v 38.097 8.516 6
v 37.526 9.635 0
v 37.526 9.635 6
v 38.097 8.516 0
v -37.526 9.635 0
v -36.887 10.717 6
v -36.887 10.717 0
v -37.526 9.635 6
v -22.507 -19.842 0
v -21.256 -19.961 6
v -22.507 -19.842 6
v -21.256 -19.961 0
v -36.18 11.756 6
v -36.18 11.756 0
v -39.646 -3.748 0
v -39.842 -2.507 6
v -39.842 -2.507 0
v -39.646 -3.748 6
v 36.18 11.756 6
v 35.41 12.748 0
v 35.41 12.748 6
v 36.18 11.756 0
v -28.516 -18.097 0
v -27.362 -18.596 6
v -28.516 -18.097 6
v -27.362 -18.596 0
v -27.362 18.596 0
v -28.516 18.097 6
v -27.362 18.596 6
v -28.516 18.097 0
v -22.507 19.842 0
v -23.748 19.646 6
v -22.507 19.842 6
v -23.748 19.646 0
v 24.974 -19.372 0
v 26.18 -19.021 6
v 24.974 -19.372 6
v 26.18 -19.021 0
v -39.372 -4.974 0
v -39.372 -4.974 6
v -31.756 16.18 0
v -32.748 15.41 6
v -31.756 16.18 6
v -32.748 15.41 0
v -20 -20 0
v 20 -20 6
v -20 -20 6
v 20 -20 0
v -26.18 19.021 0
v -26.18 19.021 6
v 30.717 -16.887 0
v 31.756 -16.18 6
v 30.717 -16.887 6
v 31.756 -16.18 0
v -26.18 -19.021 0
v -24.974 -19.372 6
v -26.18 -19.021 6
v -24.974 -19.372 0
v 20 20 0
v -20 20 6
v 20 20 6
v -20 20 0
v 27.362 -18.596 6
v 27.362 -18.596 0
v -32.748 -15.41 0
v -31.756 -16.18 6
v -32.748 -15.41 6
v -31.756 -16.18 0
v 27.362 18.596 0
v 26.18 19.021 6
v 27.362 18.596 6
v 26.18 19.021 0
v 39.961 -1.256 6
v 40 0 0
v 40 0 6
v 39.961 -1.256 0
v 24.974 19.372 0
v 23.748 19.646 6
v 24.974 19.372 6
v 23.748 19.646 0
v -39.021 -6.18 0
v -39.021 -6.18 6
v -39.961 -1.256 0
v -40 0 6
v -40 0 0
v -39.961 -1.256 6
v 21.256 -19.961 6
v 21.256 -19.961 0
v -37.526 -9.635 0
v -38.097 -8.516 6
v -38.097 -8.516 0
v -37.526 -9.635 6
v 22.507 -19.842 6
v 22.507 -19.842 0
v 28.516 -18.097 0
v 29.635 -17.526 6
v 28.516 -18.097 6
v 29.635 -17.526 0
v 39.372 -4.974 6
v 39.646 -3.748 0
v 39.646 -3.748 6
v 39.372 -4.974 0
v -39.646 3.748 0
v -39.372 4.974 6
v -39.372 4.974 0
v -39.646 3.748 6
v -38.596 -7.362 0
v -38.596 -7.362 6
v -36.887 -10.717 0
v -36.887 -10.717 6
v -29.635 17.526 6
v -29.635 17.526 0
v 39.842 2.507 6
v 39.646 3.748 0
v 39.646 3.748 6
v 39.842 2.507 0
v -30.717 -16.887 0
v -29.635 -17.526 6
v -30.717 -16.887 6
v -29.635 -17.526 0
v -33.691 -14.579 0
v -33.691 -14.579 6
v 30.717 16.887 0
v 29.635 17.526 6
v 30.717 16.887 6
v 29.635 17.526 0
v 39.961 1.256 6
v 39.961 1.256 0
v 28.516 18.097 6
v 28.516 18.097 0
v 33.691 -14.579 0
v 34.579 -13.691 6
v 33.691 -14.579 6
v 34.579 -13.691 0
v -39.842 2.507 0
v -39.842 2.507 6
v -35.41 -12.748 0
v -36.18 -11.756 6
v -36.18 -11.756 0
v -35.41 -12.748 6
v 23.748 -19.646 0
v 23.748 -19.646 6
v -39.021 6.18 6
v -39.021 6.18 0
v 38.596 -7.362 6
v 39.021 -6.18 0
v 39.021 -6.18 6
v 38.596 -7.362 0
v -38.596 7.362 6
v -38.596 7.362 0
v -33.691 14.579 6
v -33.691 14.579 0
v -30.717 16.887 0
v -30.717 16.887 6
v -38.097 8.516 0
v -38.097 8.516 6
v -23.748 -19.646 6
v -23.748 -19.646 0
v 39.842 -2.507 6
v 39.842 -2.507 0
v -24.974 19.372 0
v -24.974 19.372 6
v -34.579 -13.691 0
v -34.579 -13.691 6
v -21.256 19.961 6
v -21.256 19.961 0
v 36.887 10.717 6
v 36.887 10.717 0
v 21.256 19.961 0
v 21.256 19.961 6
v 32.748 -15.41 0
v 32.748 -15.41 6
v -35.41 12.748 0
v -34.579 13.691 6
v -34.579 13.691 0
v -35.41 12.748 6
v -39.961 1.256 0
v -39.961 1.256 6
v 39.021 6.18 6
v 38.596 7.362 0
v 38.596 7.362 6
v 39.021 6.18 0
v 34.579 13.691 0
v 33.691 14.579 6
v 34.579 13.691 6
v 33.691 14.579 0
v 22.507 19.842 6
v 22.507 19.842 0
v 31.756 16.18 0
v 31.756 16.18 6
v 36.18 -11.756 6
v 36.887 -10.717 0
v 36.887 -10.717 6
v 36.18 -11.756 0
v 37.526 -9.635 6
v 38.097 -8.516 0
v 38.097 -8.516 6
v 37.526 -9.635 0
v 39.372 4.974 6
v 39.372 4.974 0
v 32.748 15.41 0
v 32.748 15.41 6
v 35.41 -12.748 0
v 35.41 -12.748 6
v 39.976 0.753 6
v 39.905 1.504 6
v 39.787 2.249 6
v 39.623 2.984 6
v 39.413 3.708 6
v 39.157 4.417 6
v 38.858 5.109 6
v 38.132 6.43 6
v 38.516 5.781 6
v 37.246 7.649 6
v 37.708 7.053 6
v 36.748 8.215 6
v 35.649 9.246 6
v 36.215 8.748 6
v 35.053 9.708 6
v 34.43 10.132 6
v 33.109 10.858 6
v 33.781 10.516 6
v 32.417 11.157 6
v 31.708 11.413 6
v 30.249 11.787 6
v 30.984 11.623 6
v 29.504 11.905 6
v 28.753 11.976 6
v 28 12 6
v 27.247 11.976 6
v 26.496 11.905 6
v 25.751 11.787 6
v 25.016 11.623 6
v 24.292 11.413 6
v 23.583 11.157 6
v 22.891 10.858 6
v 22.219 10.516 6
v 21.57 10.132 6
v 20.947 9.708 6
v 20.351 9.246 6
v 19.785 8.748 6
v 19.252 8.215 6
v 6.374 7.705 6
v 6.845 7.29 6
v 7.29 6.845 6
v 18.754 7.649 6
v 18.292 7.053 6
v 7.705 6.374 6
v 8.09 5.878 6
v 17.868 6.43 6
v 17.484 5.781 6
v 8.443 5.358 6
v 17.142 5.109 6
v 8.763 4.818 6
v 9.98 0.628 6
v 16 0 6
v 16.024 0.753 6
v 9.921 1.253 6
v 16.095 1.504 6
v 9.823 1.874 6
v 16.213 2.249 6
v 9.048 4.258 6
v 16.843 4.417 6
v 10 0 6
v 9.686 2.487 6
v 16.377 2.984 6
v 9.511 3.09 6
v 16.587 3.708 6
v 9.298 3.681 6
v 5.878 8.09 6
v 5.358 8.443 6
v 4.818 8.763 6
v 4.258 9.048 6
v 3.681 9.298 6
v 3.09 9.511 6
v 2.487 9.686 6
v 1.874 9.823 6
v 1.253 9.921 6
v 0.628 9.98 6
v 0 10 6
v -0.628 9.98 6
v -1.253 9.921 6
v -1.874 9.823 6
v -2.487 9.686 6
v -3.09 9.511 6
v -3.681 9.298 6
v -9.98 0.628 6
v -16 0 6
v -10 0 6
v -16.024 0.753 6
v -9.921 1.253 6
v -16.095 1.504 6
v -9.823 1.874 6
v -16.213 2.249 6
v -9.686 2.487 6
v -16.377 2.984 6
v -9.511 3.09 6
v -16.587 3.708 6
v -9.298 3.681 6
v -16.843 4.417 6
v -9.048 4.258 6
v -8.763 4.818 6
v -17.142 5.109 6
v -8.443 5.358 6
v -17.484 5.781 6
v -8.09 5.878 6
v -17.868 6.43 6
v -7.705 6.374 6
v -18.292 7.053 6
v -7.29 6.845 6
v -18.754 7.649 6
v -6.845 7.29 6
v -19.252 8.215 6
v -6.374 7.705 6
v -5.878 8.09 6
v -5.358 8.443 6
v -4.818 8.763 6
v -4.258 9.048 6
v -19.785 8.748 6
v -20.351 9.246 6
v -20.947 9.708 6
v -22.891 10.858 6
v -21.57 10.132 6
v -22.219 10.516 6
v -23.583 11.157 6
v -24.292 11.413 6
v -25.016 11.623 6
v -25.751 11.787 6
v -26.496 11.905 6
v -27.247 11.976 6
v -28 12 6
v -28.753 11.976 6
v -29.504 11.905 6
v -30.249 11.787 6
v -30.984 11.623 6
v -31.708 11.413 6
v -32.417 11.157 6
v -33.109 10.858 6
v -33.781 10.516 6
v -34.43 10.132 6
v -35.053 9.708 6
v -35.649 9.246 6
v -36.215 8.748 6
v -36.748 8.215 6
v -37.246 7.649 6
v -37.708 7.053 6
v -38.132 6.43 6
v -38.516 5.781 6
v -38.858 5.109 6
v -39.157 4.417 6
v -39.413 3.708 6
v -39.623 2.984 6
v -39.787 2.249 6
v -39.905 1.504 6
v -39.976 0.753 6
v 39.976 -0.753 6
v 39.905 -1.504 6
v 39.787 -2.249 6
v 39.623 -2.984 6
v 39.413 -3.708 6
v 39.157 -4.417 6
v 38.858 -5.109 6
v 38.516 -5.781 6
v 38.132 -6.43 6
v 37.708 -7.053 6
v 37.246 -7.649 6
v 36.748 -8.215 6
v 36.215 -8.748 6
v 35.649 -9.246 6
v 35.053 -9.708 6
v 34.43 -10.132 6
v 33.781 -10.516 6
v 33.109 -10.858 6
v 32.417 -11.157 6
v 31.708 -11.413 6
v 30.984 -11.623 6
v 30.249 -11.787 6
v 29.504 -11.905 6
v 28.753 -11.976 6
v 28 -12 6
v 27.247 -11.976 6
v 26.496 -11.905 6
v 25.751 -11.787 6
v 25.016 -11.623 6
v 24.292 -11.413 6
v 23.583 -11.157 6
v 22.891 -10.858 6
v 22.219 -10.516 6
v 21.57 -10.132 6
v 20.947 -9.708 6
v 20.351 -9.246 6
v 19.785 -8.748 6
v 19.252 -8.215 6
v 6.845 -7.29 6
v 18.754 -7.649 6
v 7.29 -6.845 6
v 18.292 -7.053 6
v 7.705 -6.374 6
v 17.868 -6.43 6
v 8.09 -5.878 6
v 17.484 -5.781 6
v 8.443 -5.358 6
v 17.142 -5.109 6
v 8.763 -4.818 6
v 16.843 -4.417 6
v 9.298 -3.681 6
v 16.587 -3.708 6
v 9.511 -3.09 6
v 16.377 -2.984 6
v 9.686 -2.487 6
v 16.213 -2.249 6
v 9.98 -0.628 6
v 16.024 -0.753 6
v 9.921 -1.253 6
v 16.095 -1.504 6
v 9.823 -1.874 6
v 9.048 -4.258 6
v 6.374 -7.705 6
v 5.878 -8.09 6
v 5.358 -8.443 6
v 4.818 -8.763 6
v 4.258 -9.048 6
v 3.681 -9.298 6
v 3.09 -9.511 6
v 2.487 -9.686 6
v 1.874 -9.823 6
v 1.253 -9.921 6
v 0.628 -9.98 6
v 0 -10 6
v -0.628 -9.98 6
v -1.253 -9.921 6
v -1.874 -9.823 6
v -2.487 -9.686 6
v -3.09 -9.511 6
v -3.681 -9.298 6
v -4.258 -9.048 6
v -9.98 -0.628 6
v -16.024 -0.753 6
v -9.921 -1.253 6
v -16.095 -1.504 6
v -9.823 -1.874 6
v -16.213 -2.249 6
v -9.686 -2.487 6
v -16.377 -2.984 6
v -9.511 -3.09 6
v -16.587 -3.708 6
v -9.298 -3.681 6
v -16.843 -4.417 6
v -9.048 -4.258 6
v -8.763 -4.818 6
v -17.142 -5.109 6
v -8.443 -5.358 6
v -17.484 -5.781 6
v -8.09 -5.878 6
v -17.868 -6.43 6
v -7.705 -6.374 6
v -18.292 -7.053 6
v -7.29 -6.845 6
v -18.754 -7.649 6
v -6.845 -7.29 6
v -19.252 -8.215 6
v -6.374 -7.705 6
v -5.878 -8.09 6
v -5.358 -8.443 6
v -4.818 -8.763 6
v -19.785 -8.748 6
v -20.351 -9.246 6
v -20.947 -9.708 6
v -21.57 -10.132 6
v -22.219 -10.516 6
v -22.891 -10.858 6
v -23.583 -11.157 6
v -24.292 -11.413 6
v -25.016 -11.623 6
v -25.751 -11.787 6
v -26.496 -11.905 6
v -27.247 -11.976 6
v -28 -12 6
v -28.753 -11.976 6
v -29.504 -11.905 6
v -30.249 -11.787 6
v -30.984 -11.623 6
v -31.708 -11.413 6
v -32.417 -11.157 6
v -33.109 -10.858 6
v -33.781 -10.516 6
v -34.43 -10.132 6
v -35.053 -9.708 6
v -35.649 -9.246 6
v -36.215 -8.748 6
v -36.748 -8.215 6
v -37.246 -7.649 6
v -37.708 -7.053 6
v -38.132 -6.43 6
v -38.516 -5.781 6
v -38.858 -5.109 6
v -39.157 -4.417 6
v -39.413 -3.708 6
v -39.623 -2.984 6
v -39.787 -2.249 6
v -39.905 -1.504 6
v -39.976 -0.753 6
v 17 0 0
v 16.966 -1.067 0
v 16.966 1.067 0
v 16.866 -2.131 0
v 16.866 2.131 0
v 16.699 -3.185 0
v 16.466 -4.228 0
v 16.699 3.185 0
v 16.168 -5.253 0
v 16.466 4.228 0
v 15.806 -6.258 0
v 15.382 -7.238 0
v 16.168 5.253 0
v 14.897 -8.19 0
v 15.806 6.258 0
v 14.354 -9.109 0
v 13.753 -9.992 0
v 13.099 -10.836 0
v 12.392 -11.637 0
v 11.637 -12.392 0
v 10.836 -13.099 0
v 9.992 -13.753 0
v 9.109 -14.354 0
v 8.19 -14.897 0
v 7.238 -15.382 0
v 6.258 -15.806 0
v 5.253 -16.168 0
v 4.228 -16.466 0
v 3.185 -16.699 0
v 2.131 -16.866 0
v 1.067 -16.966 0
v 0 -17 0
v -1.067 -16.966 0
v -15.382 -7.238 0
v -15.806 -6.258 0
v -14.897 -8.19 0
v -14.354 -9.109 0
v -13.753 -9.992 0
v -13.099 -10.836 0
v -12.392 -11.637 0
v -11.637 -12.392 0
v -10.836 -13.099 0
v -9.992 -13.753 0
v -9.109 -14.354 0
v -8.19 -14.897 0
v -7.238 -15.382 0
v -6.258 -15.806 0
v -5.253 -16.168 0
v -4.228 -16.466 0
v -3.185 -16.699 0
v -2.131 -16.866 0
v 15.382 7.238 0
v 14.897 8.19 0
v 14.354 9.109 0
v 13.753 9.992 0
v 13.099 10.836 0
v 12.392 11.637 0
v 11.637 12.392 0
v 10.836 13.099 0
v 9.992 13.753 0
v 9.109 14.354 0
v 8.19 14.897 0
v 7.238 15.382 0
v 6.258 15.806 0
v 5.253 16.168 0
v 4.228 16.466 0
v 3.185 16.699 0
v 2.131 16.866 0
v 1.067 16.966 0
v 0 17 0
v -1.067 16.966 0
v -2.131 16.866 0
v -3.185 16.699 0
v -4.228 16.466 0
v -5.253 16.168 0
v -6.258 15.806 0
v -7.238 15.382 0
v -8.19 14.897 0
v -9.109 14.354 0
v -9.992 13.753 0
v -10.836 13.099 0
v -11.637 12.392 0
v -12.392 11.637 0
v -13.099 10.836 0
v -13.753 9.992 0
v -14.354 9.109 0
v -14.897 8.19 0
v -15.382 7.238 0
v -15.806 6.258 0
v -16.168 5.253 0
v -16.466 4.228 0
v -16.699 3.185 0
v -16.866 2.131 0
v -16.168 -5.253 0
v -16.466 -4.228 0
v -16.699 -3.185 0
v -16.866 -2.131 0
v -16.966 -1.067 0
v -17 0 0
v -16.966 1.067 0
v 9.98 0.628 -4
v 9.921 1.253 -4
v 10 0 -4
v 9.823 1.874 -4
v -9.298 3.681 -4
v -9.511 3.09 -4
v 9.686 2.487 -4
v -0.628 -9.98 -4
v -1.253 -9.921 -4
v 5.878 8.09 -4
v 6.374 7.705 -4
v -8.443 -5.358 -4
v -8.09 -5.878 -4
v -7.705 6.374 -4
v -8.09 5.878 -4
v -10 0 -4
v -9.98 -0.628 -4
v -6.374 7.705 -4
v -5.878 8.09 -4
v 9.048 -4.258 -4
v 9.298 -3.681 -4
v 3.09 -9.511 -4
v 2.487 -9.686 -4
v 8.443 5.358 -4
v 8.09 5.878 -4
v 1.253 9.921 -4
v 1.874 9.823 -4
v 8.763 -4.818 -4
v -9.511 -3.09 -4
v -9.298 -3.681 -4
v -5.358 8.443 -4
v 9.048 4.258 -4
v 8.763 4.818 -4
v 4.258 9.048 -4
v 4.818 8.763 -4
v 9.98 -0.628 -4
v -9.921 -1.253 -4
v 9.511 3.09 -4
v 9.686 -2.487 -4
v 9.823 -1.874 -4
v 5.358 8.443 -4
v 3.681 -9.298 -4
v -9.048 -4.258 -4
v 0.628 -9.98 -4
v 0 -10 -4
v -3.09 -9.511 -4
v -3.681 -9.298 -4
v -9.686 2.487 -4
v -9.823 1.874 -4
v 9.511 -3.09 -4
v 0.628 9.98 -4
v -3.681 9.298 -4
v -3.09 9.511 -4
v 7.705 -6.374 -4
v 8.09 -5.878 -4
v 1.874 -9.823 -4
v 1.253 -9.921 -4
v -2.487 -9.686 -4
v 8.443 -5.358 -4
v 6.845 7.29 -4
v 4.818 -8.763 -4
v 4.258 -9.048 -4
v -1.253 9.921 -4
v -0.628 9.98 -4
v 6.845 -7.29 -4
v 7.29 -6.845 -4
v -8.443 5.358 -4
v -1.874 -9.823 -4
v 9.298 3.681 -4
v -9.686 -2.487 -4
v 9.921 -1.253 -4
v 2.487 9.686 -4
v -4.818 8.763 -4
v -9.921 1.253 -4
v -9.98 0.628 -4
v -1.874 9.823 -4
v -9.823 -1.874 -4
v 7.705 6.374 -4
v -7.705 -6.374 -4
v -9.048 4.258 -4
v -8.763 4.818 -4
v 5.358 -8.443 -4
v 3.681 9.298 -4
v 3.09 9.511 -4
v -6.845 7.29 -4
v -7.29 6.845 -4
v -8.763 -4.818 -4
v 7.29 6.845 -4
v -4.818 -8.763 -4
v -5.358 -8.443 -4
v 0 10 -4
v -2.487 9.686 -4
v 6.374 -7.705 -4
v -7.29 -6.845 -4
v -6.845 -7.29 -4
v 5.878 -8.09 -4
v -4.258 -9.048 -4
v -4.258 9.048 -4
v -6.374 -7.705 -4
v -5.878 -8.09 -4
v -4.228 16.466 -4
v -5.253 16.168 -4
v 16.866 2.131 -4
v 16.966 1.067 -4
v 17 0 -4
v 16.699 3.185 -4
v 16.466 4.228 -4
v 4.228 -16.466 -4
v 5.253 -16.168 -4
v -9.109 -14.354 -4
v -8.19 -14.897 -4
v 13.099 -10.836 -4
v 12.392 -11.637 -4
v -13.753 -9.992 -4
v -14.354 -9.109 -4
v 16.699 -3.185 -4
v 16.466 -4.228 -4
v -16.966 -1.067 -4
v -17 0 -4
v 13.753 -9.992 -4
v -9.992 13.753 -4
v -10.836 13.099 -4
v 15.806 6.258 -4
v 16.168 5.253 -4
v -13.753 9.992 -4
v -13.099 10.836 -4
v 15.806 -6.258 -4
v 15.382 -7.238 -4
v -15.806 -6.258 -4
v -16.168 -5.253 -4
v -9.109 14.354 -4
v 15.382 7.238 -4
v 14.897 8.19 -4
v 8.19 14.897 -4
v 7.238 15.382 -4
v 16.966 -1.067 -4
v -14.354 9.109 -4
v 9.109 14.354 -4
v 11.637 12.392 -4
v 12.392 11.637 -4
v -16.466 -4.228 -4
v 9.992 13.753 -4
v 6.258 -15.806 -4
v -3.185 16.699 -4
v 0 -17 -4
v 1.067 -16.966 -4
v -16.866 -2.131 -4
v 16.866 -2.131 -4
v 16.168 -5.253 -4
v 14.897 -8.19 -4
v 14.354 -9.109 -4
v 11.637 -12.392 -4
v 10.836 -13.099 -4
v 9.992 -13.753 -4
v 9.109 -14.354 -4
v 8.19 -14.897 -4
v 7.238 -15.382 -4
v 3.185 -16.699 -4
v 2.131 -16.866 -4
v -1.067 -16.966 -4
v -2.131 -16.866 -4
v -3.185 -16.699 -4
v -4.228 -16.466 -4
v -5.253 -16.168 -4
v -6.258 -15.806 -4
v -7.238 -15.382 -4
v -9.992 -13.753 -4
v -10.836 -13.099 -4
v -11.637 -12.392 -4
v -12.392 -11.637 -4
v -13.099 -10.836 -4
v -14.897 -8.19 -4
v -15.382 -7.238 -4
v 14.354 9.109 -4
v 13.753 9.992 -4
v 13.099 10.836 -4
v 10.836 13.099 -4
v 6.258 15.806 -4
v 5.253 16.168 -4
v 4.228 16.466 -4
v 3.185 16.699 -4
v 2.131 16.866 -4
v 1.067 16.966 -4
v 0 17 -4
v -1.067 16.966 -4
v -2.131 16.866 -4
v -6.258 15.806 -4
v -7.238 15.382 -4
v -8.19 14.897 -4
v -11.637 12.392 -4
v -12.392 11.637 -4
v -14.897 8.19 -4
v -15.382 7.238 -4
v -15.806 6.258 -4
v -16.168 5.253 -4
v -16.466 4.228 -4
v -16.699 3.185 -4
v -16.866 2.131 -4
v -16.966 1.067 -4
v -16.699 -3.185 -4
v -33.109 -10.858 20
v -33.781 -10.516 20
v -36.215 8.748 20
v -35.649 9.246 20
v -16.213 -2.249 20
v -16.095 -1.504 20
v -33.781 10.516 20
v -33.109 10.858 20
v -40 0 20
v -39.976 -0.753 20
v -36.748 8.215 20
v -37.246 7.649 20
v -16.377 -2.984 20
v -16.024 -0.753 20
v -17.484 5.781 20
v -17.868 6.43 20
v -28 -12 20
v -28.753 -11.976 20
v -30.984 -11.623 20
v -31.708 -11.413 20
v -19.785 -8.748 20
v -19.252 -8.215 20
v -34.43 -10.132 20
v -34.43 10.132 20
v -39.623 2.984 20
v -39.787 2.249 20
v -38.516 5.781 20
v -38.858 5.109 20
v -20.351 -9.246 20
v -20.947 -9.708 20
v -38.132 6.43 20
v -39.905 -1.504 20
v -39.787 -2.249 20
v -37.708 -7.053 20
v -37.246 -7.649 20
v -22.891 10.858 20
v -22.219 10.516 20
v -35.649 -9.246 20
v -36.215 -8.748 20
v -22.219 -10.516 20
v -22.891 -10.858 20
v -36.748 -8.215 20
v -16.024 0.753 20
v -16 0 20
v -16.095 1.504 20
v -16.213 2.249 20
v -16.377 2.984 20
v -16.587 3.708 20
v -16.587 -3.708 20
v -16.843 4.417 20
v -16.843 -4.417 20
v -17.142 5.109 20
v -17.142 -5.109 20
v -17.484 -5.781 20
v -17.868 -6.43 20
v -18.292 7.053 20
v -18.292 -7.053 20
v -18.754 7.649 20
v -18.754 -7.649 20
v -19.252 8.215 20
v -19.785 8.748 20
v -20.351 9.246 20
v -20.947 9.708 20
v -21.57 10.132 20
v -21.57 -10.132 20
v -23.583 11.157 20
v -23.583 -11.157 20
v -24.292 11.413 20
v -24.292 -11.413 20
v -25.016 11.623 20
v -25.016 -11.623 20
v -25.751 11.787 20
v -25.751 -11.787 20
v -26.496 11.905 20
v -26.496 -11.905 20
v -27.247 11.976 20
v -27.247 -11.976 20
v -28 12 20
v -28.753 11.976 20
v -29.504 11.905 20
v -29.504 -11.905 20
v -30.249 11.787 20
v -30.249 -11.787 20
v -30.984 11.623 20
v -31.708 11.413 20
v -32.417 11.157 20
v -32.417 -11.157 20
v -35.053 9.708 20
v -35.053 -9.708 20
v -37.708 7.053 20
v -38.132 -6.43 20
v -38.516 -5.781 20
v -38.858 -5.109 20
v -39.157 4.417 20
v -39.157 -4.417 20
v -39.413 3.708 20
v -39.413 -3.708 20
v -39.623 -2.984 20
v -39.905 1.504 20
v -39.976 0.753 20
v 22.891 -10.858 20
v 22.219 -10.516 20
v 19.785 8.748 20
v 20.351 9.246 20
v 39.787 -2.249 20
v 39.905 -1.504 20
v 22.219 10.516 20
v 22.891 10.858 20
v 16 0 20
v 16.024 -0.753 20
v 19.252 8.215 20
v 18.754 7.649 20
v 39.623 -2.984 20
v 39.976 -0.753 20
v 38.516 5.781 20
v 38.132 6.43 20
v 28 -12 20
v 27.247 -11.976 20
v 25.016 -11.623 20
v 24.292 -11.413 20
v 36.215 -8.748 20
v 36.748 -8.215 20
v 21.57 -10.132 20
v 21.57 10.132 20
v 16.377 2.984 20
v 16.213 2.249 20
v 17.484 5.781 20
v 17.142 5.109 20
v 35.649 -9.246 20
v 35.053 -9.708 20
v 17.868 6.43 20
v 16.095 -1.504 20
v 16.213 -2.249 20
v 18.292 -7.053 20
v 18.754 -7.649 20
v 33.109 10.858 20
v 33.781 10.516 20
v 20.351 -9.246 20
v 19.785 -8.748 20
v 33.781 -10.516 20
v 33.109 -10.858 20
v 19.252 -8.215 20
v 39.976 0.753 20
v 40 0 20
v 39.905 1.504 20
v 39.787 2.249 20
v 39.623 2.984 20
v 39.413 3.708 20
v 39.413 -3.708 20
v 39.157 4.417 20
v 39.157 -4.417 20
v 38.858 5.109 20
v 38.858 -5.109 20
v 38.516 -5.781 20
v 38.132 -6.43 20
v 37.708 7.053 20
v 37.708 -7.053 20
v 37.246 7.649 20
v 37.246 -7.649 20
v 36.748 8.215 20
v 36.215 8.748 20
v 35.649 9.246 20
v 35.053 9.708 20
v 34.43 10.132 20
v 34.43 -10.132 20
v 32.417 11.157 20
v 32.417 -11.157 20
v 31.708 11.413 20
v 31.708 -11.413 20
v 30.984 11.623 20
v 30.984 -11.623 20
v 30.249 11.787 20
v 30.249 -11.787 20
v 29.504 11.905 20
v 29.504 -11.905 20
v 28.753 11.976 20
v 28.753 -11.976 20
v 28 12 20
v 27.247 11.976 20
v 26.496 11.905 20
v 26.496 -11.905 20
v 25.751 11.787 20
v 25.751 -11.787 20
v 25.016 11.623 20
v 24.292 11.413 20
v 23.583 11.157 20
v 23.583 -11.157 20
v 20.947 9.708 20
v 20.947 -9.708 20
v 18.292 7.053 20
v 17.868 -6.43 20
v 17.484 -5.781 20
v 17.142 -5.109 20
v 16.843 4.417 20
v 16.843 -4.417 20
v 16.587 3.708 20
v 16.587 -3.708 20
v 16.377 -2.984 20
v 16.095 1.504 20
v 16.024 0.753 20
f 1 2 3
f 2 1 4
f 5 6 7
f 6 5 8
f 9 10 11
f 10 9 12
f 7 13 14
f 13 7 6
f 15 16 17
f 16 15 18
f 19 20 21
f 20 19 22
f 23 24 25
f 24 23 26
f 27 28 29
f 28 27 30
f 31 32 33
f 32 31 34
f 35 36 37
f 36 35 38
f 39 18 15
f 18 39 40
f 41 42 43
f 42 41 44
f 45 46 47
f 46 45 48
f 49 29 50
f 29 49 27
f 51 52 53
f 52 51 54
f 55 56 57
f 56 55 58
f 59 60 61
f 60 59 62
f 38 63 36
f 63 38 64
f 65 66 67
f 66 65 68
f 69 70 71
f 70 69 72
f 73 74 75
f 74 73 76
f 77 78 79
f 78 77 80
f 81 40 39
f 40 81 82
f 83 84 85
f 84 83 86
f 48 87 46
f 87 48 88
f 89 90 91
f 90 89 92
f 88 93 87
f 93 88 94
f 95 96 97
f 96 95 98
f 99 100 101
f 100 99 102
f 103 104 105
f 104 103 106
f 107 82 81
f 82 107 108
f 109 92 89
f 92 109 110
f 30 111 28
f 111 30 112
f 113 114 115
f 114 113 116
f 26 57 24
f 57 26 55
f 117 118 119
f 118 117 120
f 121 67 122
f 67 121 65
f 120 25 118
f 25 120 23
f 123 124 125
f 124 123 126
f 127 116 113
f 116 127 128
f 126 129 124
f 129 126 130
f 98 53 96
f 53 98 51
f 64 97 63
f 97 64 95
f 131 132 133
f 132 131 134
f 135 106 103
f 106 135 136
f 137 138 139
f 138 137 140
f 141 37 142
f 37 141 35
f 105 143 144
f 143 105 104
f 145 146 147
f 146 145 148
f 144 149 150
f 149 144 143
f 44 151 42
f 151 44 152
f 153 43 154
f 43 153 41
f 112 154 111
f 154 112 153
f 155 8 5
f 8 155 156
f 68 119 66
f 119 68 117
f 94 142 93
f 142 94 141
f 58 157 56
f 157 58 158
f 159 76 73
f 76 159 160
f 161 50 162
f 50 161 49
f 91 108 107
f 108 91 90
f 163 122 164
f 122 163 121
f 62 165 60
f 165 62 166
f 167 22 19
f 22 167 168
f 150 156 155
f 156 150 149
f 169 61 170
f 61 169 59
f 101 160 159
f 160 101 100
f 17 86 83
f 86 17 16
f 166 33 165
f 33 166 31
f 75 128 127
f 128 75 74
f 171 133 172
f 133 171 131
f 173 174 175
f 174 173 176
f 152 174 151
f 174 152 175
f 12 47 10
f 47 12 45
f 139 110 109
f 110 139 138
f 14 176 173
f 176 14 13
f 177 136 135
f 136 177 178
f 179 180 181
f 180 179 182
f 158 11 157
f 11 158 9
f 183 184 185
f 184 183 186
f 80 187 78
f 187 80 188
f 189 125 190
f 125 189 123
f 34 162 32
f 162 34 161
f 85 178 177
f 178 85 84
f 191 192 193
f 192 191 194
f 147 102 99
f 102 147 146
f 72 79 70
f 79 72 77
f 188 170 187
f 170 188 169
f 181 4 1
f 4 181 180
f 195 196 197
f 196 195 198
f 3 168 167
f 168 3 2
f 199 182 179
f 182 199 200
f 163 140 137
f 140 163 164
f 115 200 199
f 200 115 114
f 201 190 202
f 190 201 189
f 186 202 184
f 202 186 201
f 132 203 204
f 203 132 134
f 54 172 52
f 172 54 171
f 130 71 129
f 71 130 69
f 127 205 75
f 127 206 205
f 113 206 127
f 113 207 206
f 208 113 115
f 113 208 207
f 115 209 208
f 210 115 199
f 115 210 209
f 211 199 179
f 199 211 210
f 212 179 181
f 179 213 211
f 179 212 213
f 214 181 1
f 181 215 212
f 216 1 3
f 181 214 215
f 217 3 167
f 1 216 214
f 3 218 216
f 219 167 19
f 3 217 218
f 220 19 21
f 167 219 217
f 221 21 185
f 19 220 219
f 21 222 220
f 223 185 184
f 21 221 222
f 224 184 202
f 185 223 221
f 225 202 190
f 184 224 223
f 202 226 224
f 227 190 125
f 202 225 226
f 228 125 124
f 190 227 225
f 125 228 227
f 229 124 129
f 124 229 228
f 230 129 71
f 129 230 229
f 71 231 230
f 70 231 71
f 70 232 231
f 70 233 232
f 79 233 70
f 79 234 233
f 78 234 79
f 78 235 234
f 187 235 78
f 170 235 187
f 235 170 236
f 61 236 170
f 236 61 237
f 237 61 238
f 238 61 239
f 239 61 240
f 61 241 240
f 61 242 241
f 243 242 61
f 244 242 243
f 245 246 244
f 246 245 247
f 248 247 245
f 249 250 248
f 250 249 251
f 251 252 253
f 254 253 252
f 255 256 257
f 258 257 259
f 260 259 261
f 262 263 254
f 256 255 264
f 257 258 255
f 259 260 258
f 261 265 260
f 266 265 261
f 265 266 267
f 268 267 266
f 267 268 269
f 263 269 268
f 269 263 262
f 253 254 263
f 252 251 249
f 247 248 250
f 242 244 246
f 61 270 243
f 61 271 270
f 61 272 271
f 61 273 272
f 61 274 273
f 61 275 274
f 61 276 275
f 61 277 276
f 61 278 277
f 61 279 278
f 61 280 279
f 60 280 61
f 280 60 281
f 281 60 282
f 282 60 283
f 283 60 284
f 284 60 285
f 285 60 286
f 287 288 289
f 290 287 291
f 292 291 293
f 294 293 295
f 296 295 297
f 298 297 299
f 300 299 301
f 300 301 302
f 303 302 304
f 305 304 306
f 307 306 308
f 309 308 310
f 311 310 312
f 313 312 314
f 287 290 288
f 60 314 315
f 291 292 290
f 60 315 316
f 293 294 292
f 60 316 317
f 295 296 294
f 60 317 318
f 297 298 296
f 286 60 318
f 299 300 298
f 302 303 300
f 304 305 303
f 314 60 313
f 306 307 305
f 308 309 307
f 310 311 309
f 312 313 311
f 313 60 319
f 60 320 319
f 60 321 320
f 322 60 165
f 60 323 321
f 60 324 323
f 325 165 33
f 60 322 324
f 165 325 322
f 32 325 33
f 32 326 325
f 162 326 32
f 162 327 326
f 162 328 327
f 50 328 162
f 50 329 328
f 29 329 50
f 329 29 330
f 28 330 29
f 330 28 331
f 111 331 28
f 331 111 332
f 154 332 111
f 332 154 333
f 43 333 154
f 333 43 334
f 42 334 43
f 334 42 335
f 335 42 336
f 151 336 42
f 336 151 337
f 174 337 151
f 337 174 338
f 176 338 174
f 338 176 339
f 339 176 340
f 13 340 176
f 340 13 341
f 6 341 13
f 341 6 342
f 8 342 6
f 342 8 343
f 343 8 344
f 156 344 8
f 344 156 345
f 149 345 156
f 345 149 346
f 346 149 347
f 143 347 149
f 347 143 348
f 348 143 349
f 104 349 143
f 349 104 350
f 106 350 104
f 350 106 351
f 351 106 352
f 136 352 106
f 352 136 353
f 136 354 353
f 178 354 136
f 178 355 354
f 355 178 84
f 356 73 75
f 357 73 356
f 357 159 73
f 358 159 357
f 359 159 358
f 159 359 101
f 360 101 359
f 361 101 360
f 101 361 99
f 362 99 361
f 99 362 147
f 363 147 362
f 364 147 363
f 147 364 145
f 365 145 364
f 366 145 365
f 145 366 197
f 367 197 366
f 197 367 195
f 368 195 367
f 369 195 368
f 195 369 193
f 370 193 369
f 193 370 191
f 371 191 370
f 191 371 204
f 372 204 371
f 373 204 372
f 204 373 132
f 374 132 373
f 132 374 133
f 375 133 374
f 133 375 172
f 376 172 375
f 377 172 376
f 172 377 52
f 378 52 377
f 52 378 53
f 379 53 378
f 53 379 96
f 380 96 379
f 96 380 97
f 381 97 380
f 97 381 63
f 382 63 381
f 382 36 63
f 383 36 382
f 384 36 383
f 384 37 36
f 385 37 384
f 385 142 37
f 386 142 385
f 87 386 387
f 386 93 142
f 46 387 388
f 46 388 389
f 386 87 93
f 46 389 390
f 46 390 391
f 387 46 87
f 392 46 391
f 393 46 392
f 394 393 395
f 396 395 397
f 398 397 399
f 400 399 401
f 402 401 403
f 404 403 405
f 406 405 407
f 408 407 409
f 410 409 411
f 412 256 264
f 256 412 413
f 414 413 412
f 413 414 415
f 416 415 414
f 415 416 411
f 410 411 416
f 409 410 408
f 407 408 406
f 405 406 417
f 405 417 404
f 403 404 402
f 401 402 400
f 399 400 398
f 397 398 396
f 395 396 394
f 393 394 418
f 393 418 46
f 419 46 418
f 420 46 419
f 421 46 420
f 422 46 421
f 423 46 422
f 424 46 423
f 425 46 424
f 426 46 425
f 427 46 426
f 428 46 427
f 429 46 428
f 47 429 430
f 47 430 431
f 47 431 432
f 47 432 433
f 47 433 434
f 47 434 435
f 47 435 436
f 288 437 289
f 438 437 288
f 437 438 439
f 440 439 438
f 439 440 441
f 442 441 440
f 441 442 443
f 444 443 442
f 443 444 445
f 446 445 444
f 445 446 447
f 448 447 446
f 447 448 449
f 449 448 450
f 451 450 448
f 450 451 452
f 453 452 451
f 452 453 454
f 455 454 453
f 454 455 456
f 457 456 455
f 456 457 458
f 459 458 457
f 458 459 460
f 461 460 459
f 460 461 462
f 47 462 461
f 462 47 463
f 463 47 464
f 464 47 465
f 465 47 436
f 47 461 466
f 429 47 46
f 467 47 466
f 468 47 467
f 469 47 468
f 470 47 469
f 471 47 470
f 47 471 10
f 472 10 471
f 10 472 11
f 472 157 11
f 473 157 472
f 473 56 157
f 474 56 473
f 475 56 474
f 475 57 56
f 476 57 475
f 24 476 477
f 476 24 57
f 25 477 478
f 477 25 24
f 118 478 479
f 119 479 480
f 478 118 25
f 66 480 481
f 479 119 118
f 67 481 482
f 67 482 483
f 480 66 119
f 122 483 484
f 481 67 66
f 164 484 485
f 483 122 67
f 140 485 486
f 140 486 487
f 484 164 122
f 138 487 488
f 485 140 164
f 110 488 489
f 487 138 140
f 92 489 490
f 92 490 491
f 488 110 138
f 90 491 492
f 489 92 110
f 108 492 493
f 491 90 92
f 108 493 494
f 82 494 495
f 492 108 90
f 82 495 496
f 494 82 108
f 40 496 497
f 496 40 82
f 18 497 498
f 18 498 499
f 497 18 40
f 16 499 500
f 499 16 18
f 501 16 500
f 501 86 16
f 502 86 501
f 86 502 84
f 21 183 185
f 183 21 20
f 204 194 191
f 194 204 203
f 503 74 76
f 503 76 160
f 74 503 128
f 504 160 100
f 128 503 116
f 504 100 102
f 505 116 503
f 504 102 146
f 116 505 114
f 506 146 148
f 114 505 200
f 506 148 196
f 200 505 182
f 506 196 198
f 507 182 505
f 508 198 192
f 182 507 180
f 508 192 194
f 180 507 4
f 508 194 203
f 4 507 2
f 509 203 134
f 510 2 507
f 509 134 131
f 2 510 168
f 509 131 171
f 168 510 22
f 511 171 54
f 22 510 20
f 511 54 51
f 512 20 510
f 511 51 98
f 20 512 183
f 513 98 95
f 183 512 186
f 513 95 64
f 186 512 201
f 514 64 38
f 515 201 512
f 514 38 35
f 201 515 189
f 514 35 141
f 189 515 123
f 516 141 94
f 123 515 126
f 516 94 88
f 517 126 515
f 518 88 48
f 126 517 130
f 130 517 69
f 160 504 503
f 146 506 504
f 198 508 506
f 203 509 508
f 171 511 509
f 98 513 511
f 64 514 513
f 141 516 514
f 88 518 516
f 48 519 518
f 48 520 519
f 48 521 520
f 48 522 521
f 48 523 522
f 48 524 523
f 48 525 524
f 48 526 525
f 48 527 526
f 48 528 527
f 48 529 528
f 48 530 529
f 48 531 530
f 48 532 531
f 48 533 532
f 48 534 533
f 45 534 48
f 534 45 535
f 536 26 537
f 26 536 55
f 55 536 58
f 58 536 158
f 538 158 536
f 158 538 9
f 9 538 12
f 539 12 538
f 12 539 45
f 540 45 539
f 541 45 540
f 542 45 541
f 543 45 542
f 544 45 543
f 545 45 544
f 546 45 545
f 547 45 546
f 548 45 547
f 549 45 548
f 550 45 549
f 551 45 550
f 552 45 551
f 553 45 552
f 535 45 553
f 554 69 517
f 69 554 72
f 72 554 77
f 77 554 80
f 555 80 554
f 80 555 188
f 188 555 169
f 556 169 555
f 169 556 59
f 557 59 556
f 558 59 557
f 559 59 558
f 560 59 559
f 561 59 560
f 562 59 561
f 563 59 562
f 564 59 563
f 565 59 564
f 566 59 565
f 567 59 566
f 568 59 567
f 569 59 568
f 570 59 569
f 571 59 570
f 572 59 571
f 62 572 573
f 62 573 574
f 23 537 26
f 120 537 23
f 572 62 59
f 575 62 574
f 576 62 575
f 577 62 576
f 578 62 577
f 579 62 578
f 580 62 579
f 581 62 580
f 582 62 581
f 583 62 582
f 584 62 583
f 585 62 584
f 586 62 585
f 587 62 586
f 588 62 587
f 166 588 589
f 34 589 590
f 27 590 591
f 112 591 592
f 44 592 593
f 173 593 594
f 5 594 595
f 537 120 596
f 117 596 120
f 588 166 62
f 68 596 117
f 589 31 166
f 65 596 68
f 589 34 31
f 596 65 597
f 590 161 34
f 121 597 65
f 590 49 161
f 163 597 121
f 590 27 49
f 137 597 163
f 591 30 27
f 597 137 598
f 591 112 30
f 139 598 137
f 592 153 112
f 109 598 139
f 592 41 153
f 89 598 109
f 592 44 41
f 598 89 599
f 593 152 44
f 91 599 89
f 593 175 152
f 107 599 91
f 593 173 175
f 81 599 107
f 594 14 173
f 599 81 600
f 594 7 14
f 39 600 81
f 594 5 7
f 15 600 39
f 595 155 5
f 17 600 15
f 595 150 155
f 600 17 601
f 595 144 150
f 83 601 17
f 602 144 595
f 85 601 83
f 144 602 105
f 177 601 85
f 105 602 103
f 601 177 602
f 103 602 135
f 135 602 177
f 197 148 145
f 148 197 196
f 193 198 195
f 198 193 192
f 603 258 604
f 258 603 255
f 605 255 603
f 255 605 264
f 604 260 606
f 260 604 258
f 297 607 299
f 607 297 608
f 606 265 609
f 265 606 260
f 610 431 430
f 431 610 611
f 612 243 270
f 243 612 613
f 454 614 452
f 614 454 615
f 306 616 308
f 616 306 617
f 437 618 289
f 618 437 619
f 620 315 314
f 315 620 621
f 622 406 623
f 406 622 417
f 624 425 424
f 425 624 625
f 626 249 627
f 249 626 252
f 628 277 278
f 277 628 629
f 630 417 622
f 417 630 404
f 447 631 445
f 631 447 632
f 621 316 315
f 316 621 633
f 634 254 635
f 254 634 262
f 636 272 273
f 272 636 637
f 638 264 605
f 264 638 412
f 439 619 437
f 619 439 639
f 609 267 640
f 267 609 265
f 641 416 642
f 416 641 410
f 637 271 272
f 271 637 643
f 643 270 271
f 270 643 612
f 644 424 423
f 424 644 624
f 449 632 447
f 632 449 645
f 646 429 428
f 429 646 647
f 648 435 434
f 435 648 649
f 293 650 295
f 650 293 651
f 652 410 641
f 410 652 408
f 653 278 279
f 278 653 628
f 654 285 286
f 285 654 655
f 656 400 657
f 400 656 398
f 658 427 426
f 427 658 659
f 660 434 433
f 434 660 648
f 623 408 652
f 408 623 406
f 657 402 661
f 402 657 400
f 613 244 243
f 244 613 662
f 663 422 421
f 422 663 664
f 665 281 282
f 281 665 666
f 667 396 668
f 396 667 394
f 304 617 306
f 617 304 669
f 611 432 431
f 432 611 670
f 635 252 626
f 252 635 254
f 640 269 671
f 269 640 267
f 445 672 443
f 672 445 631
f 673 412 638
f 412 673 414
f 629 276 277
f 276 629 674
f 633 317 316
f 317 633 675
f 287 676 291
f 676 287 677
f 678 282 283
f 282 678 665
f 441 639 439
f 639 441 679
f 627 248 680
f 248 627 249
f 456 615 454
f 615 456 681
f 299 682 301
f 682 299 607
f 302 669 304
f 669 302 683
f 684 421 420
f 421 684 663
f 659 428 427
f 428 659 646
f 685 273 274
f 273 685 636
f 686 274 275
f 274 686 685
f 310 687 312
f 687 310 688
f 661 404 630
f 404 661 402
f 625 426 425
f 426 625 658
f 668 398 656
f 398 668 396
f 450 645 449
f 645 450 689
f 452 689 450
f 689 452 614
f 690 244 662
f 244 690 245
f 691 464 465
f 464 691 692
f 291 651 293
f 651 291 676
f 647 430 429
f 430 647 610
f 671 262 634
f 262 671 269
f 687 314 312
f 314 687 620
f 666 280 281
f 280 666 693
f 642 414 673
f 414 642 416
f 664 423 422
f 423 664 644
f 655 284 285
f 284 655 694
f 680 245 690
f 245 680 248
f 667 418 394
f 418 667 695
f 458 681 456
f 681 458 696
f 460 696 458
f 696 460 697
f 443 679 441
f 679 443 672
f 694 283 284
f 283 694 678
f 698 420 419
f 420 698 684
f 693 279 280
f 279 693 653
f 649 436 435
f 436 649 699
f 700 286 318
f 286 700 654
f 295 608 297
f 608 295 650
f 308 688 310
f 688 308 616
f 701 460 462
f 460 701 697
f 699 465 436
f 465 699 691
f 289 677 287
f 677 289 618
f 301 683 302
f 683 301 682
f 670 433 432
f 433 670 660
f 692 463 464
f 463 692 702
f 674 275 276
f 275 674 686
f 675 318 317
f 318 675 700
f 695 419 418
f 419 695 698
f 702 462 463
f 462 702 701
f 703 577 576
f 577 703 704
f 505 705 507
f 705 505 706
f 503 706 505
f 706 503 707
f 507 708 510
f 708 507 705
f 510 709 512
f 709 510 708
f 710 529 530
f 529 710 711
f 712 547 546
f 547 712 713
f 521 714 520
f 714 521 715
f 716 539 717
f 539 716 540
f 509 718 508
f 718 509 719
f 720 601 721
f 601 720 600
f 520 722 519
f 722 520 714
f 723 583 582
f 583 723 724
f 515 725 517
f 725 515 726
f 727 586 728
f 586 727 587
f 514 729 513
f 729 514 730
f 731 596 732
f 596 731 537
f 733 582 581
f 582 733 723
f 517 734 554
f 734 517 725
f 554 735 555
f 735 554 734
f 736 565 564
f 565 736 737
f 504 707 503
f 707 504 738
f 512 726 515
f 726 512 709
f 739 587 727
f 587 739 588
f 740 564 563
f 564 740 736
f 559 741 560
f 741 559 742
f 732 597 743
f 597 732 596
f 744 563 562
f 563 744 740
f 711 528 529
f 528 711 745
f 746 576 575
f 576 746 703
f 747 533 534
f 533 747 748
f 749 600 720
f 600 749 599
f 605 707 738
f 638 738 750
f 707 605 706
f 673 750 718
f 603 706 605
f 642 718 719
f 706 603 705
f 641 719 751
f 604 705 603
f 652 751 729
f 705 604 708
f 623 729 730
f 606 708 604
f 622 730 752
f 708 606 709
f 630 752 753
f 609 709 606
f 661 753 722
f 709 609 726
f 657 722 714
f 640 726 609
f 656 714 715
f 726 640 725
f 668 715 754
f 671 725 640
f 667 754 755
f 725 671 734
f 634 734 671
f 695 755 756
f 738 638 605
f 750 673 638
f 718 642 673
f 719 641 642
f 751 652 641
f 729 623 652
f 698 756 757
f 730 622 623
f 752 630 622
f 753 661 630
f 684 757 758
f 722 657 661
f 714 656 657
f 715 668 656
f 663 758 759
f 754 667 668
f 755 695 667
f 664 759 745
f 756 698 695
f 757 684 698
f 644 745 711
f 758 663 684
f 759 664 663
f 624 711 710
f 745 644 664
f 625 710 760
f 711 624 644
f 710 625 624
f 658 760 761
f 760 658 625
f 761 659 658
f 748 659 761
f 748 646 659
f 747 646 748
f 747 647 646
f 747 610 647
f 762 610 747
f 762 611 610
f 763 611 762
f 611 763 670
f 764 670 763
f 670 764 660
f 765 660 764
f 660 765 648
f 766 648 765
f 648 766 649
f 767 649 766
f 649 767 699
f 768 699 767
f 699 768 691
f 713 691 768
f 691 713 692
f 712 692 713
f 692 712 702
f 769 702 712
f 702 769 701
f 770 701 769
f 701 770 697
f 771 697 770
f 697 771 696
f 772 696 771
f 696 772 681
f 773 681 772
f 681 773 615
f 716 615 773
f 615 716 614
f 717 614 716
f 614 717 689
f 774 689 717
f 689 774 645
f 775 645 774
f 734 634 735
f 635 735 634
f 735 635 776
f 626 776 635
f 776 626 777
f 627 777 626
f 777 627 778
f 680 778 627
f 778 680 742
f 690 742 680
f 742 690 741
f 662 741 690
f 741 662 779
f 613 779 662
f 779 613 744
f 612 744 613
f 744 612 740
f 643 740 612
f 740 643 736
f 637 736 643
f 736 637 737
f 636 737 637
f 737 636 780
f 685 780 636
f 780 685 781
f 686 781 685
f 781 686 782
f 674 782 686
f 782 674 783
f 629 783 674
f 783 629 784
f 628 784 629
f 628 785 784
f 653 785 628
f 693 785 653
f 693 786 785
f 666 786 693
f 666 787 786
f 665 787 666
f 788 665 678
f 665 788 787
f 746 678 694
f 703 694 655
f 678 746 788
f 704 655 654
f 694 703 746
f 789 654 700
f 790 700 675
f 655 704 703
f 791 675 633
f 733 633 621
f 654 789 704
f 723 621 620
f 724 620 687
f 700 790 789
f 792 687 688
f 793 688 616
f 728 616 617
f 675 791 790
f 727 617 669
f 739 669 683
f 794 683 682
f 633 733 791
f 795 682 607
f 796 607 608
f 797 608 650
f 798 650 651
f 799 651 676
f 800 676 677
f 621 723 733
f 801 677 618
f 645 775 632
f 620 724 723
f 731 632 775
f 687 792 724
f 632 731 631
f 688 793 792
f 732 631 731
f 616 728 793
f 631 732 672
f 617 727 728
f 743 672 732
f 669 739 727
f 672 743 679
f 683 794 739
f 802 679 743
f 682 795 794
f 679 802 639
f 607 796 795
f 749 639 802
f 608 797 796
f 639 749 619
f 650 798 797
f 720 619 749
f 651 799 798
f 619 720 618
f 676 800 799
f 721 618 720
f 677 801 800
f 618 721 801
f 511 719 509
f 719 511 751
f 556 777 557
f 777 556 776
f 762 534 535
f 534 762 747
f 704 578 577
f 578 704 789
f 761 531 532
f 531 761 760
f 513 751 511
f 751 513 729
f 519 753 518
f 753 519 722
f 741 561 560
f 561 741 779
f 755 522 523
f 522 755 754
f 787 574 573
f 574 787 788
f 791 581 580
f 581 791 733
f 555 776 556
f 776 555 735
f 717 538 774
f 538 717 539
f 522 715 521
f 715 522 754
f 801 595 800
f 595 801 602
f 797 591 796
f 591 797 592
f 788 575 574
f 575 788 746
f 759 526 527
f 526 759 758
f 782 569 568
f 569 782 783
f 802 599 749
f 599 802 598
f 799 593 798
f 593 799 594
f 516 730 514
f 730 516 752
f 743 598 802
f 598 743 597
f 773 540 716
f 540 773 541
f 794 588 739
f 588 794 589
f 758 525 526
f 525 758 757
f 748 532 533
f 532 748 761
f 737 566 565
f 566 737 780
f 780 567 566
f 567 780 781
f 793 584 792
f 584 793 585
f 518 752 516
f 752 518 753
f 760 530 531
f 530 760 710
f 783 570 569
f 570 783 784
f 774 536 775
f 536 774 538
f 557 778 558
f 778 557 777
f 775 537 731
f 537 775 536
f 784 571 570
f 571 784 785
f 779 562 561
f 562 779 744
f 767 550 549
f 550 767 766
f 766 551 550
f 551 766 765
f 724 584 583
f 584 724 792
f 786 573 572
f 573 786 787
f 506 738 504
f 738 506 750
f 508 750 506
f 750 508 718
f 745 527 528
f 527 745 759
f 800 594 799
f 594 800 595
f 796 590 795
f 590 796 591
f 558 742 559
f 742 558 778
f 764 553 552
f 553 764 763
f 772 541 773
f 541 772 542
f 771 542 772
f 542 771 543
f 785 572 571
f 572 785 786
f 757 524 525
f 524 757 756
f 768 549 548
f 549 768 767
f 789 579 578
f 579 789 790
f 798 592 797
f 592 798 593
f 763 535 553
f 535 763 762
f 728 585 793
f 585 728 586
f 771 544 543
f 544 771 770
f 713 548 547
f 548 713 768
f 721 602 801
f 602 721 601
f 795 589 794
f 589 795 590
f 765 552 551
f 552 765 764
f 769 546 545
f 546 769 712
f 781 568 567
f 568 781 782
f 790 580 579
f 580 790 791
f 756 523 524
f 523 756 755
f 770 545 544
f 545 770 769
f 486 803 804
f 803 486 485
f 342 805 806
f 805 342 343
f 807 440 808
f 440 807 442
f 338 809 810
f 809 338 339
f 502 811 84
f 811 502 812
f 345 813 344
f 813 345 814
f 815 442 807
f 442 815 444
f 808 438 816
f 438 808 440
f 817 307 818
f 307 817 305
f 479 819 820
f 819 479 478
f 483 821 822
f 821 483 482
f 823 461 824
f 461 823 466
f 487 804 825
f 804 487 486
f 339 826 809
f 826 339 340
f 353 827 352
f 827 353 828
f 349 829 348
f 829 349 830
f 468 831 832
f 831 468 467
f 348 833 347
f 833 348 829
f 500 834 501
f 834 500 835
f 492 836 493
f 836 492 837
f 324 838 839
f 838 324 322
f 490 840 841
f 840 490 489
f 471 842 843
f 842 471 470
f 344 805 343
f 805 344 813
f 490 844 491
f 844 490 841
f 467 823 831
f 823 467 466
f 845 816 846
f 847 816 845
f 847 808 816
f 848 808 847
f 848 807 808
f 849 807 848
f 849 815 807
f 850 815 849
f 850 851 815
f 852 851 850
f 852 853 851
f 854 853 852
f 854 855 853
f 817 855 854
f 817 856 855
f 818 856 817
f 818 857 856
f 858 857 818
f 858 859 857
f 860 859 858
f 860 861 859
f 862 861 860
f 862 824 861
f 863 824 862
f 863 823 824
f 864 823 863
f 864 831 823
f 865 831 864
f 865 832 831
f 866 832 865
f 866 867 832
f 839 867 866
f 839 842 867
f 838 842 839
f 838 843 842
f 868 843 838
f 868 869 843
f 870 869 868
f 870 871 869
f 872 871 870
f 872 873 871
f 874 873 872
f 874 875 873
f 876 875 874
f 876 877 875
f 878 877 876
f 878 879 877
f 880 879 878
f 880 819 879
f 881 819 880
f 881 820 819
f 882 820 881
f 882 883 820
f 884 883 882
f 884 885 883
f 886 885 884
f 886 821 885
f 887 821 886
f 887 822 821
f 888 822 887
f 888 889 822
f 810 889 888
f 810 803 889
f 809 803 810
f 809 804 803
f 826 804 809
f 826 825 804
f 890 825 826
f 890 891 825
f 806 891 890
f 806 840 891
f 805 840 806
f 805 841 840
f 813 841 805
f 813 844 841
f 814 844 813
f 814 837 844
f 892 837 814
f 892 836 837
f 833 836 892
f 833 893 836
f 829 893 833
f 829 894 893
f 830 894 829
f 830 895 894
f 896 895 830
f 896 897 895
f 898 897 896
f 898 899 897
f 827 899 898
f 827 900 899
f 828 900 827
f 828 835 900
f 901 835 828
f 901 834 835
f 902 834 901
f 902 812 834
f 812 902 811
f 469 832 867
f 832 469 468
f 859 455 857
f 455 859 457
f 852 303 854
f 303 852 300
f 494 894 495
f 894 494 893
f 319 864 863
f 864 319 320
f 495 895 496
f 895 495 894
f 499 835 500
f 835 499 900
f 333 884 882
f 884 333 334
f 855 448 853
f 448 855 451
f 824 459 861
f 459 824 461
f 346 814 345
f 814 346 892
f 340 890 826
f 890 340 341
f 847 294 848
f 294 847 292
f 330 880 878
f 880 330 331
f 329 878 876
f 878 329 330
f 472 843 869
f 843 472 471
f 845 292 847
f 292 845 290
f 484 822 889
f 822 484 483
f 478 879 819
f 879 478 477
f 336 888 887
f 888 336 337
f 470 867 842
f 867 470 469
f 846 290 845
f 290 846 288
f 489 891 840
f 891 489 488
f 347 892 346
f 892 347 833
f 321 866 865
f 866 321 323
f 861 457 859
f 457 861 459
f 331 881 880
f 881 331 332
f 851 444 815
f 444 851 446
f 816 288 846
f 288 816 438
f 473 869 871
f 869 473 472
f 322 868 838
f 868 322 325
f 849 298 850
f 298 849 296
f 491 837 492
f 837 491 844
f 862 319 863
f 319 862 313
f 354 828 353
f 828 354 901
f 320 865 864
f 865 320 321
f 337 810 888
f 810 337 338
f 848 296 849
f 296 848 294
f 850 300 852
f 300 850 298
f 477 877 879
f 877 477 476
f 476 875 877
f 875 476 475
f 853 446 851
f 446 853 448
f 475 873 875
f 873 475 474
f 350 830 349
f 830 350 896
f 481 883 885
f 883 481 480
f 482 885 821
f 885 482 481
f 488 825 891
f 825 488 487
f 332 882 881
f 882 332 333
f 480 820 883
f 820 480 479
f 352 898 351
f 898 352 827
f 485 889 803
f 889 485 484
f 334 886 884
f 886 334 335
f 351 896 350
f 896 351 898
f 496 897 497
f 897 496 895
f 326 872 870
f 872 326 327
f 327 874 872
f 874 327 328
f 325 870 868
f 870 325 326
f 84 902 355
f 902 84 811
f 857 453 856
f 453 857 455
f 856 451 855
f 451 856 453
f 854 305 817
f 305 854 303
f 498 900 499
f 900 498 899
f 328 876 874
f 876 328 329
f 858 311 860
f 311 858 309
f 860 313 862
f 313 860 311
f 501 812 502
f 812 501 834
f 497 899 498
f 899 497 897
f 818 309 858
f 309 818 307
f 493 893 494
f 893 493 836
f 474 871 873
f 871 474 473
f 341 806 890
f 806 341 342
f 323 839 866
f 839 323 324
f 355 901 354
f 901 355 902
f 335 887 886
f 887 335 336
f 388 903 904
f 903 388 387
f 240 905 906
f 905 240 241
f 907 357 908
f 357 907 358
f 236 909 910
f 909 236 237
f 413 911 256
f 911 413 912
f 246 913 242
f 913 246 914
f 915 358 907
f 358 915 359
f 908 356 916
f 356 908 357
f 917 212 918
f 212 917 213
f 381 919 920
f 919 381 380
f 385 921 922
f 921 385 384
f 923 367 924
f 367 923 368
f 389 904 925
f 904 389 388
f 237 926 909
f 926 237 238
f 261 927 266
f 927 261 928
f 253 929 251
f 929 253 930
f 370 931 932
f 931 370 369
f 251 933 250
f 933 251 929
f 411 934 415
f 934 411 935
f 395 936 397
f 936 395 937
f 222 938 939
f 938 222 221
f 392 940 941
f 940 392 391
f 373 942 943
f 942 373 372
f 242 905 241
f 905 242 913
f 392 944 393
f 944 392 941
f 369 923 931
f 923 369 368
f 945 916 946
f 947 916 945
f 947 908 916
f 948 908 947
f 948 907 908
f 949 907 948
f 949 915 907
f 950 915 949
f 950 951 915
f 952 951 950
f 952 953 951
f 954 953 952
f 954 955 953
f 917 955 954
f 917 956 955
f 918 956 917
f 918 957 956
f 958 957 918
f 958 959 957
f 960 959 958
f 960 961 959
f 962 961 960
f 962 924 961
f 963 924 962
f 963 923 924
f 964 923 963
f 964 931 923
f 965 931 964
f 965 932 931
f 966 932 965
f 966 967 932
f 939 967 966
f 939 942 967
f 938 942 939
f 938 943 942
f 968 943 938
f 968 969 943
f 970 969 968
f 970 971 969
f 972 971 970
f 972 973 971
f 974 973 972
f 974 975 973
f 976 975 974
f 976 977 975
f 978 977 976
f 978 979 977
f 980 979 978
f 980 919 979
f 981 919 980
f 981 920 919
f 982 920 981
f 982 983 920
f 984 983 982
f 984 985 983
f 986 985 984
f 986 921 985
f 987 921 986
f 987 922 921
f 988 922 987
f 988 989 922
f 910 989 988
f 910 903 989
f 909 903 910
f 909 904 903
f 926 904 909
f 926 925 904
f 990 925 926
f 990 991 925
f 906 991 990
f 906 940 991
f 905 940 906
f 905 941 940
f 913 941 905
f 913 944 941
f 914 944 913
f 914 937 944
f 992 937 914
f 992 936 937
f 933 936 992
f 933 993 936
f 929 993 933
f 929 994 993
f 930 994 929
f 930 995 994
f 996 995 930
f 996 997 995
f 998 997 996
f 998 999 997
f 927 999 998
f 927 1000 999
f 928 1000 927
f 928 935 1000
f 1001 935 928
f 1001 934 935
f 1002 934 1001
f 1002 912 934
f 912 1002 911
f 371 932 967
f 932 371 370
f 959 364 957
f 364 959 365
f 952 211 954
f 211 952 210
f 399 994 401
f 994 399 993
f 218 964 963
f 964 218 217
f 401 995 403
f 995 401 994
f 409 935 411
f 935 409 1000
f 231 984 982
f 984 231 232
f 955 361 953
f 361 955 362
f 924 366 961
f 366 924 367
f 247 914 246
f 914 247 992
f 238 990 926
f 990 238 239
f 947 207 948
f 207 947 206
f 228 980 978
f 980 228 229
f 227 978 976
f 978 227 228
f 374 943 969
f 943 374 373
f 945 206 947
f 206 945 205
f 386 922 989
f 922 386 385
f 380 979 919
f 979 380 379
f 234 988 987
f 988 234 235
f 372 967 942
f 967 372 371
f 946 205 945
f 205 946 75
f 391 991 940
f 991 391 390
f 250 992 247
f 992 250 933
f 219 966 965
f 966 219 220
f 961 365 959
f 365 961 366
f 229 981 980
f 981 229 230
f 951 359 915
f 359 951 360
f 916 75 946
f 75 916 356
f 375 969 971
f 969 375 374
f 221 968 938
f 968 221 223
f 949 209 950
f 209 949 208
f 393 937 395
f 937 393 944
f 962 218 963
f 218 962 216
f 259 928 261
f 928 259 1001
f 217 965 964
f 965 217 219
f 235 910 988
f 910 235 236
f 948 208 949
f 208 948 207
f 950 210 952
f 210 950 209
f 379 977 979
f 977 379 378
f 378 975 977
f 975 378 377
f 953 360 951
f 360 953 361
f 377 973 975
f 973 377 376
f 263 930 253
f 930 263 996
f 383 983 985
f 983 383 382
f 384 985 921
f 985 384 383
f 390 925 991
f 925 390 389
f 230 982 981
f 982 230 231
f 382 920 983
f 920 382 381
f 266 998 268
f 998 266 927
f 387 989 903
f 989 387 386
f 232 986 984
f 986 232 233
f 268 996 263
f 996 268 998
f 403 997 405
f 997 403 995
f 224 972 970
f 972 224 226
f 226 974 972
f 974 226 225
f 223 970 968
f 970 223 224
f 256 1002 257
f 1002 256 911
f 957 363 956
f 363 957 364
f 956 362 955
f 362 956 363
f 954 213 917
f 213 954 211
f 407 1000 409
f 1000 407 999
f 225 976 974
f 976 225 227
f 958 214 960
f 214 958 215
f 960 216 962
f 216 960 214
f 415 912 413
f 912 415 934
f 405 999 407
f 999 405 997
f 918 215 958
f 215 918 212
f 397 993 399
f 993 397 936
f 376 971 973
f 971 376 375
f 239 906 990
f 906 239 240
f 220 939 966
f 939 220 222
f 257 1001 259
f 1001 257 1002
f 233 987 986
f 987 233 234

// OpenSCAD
// ============================================================
// Stepped Plate with Central Opening, Underside Collar,
// and Tall Rounded End Tabs
// ============================================================

// ---------------- Parameters ----------------
plate_length    = 80;   // overall length of the base plate (X)
plate_width     = 40;   // overall width of the base plate (Y)
plate_thickness = 6;    // thickness of the base plate (Z)

end_radius      = 20;   // radius of the arcs forming the plate outline ends

center_hole_d   = 20;   // diameter of the central through opening
collar_outer_d  = 34;   // outer diameter of the annular collar
collar_height   = 4;    // height (thickness) of the underside collar

tab_height      = 20;   // total height of the tall end tabs (from plate bottom)
tab_width       = 24;   // width (Y) of each rounded tab
tab_thickness   = 10;   // thickness (X) of each tab
tab_hole_d      = 8;    // diameter of the through opening in each tab

$fn = 100;              // smoothness of curved surfaces

// ---------------- Helper modules ----------------

// Arc-based (stadium-like) plate outline: hull of two circles,
// so the outline is formed purely by arcs and tangent lines.
module arc_plate(length, width, thickness) {
    r = width / 2;
    hull() {
        translate([-(length/2 - r), 0, 0]) cylinder(h=thickness, r=r);
        translate([ (length/2 - r), 0, 0]) cylinder(h=thickness, r=r);
    }
}

// Hollow annular ring (collar) around the central opening.
module collar(outer_d, inner_d, height) {
    difference() {
        cylinder(h=height, d=outer_d);
        translate([0, 0, -1]) cylinder(h=height + 2, d=inner_d);
    }
}

// Tall rounded tab: vertical rounded block with a through hole.
module rounded_tab(width, thickness, height, hole_d) {
    r = width / 2;
    difference() {
        hull() {
            translate([0, -(width/2 - r), 0]) cylinder(h=height, r=r);
            translate([0,  (width/2 - r), 0]) cylinder(h=height, r=r);
        }
        // Through hole across the tab thickness (X direction)
        rotate([0, 90, 0])
            translate([0, 0, -(thickness + 2) / 2])
                cylinder(h=thickness + 2, d=hole_d, center=true);
    }
}

// ---------------- Main model ----------------

// Step 1: base plate with arc-based outline and central through opening
difference() {
    // solid shallow plate (sits with bottom at z = 0)
    translate([0, 0, 0])
        arc_plate(plate_length, plate_width, plate_thickness);

    // central through opening, cut through the full plate thickness
    translate([0, 0, -1])
        cylinder(h=plate_thickness + 2, d=center_hole_d);
}

// Step 2: shallow annular collar on the underside around the opening
// (hollow ring, extends below z = 0)
translate([0, 0, -collar_height])
    collar(collar_outer_d, center_hole_d, collar_height);

// Step 3: tall rounded tabs at the two ends of the plate,
// rising well above the base plate
tab_offset = plate_length/2 - tab_thickness/2 - end_radius * 0.35;
for (sx = [-1, 1]) {
    translate([sx * tab_offset, 0, 0])
        rounded_tab(tab_width, tab_thickness, tab_height, tab_hole_d);
}
